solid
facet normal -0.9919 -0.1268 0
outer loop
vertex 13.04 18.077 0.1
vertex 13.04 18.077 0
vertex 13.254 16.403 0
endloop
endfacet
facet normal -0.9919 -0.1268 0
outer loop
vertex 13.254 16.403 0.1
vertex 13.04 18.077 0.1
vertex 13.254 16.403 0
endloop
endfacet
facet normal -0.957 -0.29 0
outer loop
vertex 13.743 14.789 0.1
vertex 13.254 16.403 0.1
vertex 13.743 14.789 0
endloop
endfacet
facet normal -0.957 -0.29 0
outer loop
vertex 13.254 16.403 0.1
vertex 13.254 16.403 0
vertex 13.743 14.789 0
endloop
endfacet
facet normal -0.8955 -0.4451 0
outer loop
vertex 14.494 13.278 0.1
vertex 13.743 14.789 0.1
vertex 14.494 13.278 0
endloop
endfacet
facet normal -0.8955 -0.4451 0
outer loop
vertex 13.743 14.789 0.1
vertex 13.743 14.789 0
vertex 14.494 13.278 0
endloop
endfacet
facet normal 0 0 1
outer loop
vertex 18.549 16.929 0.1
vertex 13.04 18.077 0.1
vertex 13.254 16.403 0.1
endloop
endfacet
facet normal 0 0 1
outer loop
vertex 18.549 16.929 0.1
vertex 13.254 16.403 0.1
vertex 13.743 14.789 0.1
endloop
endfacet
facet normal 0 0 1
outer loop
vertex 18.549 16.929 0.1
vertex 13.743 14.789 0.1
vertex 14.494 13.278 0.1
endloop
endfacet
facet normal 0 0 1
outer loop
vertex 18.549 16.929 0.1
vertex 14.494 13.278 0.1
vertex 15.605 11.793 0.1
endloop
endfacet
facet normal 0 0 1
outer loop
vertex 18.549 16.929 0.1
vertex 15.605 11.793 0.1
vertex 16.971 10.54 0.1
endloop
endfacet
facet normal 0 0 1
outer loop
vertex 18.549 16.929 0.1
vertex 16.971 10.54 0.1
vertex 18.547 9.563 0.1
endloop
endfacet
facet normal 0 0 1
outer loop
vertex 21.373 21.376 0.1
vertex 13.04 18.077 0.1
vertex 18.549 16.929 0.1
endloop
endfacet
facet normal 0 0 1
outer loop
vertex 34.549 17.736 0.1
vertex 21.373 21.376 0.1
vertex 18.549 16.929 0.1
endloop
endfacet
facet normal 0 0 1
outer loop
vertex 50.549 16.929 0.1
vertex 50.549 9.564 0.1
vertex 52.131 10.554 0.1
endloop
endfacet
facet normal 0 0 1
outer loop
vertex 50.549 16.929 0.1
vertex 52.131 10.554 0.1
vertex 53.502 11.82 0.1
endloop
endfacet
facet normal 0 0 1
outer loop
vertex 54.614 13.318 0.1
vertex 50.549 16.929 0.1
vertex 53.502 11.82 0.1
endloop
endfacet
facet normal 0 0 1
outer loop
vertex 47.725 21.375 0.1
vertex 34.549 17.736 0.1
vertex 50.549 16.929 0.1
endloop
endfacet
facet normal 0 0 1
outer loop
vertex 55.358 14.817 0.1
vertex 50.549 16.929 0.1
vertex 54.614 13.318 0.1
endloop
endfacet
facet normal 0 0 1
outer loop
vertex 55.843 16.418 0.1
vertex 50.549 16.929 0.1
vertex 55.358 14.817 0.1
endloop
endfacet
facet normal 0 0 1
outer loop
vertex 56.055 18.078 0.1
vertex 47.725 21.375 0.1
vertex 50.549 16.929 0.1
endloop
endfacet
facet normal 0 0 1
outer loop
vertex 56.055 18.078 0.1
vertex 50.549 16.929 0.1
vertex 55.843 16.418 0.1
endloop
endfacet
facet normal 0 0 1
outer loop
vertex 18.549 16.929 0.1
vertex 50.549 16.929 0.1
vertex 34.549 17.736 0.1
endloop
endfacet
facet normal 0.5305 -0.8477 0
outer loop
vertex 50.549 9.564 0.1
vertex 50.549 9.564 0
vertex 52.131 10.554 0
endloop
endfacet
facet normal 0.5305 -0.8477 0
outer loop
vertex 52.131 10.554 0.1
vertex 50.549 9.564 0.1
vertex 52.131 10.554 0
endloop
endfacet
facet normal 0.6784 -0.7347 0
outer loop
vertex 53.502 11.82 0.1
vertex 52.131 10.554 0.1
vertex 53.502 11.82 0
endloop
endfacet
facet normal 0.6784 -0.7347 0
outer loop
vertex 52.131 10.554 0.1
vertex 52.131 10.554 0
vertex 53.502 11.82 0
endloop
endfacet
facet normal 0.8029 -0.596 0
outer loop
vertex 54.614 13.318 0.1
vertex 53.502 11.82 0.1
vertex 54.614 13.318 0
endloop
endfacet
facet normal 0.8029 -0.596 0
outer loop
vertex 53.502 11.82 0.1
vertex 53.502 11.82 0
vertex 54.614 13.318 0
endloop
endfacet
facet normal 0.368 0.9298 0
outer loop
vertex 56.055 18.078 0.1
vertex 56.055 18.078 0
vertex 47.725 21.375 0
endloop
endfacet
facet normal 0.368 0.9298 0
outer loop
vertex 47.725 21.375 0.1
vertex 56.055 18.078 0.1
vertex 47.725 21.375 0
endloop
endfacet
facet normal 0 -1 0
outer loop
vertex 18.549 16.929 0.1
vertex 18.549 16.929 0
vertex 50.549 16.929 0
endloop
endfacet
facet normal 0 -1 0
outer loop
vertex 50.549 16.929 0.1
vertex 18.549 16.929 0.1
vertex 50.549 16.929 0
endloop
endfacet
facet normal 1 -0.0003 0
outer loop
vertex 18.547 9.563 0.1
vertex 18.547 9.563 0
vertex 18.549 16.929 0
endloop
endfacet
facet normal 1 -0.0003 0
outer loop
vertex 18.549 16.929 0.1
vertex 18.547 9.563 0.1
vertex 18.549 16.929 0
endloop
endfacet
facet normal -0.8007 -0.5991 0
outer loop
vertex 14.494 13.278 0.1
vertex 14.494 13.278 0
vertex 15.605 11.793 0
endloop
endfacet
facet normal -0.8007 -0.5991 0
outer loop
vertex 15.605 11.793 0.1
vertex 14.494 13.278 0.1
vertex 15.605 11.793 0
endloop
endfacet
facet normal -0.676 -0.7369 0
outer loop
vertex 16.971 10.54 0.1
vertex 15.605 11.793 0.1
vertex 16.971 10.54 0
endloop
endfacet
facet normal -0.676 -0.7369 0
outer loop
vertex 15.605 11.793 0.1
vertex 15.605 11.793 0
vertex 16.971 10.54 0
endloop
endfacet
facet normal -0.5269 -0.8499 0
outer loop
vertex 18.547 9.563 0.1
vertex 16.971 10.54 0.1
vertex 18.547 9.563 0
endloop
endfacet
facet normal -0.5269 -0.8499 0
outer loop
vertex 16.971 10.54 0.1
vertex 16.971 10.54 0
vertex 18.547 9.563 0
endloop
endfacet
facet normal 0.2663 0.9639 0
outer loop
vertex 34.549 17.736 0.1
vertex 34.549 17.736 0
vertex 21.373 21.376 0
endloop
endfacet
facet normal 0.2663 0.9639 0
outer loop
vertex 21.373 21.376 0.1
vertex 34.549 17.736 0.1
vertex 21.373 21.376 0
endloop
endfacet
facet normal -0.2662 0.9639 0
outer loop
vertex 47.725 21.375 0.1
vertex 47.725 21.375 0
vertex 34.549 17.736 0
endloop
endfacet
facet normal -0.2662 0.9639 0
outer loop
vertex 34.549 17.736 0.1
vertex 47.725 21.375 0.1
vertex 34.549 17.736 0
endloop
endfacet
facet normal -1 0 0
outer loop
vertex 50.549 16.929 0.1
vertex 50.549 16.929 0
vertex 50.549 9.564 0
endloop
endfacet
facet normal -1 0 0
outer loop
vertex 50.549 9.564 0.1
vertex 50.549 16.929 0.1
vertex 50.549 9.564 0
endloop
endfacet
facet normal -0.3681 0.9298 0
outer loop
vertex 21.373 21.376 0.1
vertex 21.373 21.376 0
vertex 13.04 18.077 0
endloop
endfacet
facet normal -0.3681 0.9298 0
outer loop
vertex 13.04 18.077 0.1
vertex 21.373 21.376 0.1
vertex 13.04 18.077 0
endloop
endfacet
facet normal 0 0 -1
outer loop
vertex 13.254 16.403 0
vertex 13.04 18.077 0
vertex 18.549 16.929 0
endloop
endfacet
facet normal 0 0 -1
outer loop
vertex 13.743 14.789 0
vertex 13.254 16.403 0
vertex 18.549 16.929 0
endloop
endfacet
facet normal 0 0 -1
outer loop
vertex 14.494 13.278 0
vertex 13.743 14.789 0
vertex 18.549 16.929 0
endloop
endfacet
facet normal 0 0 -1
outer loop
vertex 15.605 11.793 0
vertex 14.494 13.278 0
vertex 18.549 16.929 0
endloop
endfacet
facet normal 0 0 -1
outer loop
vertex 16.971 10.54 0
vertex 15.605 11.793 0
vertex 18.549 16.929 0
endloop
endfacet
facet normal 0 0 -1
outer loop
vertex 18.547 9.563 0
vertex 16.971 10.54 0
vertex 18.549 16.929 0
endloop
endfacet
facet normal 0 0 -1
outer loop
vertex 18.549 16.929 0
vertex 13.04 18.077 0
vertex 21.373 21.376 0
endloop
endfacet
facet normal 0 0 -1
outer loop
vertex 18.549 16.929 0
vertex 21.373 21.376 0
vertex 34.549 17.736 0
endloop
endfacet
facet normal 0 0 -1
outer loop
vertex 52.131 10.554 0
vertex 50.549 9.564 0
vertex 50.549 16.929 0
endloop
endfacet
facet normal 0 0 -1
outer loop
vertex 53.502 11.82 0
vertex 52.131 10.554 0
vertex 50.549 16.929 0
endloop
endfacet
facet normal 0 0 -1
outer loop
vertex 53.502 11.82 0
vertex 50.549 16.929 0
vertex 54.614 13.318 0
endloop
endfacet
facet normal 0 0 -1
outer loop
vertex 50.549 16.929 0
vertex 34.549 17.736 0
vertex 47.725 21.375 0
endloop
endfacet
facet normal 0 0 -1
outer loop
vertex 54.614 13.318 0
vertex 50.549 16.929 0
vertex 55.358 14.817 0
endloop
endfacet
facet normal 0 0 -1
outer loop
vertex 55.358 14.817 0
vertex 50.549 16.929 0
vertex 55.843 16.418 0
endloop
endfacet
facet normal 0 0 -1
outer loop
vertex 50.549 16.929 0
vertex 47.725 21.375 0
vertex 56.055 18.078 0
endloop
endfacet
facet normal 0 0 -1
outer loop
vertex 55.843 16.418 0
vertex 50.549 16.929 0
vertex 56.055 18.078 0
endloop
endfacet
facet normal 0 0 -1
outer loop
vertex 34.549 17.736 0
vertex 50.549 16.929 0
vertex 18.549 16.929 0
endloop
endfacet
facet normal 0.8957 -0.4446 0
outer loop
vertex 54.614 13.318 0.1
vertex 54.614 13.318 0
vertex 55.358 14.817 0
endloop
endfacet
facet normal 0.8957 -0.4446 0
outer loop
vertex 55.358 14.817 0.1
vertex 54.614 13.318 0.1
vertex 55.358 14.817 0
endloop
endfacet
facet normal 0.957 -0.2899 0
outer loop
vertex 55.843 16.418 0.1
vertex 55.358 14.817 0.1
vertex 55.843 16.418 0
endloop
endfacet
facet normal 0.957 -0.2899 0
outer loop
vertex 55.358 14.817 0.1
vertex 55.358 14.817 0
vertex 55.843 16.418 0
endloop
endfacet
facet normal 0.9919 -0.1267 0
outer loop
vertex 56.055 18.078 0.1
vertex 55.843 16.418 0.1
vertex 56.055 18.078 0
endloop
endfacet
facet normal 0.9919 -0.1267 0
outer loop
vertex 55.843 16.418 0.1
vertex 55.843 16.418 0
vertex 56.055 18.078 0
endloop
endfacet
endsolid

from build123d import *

# Parameters (mm, degrees)
SALIENTE_EXTRUIR1_DEPTH = 0.1


with BuildPart() as part:
    # Model → Saliente-Extruir1 (new body)
    with BuildSketch(Plane.XY):
        with BuildLine():
            Line((18.549433899, 16.929238501), (35.049433899, 16.929238501))
            Line((35.049433899, 16.929238501), (50.549433899, 16.929238501))
            Line((50.549433899, 16.929238501), (50.549433899, 9.564394878))
            ThreePointArc((50.549433899, 9.564394878), (52.846061309, 11.155038033), (54.613628105, 13.318449858))
            ThreePointArc((54.613628105, 13.318449858), (55.63441871, 15.607287158), (56.05464892, 18.077954318))
            Line((56.05464892, 18.077954318), (47.725070346, 21.375387298))
            Line((47.725070346, 21.375387298), (34.549148093, 17.736158759))
            Line((34.549148093, 17.736158759), (21.373432242, 21.375830254))
            Line((21.373432242, 21.375830254), (13.040093285, 18.077232707))
            ThreePointArc((13.040093285, 18.077232707), (13.464781987, 15.585792102), (14.494191445, 13.277556205))
            ThreePointArc((14.494191445, 13.277556205), (16.258659897, 11.134658879), (18.546640013, 9.562874906))
            Line((18.546640013, 9.562874906), (18.549433899, 16.929238501))
        make_face()
    extrude(amount=SALIENTE_EXTRUIR1_DEPTH)


solid = part.part
